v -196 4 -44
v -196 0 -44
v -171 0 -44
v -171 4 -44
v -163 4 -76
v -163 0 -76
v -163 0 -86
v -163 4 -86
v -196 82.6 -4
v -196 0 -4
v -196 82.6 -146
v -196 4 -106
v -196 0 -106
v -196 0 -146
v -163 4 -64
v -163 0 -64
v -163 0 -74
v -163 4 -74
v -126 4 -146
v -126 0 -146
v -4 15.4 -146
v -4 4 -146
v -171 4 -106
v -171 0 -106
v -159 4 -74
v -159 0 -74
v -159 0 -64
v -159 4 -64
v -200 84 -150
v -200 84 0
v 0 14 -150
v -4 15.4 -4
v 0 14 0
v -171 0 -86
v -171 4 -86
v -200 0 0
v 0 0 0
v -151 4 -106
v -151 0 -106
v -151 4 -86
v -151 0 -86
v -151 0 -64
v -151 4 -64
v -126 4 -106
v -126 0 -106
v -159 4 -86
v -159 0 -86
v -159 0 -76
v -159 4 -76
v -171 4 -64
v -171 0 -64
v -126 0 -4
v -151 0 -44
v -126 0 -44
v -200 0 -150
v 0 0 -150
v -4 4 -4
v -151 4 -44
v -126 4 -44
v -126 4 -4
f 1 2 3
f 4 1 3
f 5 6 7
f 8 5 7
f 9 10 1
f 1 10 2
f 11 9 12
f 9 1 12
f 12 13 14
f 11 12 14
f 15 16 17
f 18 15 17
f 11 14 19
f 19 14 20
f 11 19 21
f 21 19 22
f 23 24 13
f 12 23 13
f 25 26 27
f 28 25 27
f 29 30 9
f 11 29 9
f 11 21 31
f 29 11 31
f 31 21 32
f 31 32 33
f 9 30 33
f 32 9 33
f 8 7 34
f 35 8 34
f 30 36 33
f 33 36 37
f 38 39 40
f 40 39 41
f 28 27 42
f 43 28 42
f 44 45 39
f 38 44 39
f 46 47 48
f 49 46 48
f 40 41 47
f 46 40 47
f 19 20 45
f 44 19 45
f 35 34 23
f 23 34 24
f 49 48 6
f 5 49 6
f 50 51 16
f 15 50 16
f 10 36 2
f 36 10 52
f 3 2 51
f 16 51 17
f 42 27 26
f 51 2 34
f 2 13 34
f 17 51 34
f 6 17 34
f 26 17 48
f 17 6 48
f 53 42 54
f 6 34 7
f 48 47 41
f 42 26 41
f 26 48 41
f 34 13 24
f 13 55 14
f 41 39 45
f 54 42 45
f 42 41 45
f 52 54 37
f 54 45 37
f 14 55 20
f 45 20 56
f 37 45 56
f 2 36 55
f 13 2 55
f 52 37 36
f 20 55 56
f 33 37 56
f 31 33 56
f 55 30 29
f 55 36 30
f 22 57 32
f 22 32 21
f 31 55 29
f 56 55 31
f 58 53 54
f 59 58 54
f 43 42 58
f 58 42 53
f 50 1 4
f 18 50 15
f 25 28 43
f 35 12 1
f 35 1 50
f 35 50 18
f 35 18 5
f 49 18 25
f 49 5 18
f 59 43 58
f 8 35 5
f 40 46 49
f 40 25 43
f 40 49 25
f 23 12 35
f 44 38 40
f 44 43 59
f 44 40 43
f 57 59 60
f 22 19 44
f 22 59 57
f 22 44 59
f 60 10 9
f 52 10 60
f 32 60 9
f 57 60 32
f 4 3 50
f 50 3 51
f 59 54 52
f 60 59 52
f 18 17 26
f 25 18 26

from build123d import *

# Parameters (mm, degrees)
SKETCH1_W           = 200
SKETCH1_H           = 150
SKETCH1_W_2         = 192
SKETCH1_H_2         = 142
BOSS_EXTRUDE2_DEPTH = 4
SKETCH2_W           = 200
SKETCH2_H           = 150
SKETCH2_W_2         = 192
SKETCH2_H_2         = 142
BOSS_EXTRUDE3_DEPTH = 80
CUT_EXTRUDE1_DEPTH  = 150


with BuildPart() as part:
    # Sketch1 → Boss-Extrude2 (new body)
    # profile 1 of 3: a face of its own
    with BuildSketch(Plane(origin=(0, 0, 0), x_dir=(1, 0, 0), z_dir=(0, 1, 0))):
        with Locations((-100, 75)):
            Rectangle(SKETCH1_W, SKETCH1_H)
        with Locations((-100, 75)):
            Rectangle(SKETCH1_W_2, SKETCH1_H_2, mode=Mode.SUBTRACT)
    # profile 2 of 3: a face of its own
    with BuildSketch(Plane(origin=(0, 0, 0), x_dir=(1, 0, 0), z_dir=(0, 1, 0))):
        Polygon((-4, 75), (-196, 75), (-196, 44), (-171, 44), (-171, 64), (-163, 64), (-163, 74), (-159, 74), (-159, 64), (-151, 64), (-151, 44), (-126, 44), (-126, 4), (-4, 4), align=None)
    # profile 3 of 3: a face of its own
    with BuildSketch(Plane(origin=(0, 0, 0), x_dir=(1, 0, 0), z_dir=(0, 1, 0))):
        Polygon((-196, 106), (-196, 75), (-4, 75), (-4, 146), (-126, 146), (-126, 106), (-151, 106), (-151, 86), (-159, 86), (-159, 76), (-163, 76), (-163, 86), (-171, 86), (-171, 106), align=None)
    extrude(amount=BOSS_EXTRUDE2_DEPTH)

    # Sketch2 → Boss-Extrude3 (add)
    with BuildSketch(Plane(origin=(0, 4, 0), x_dir=(1, 0, 0), z_dir=(0, 1, 0))):
        with Locations((-100, 75)):
            Rectangle(SKETCH2_W, SKETCH2_H)
        with Locations((-100, 75)):
            Rectangle(SKETCH2_W_2, SKETCH2_H_2, mode=Mode.SUBTRACT)
    extrude(amount=BOSS_EXTRUDE3_DEPTH)

    # Sketch3 → Cut-Extrude1 (cut)
    with BuildSketch(Plane.XY):
        Polygon((-200, 84), (0, 14), (0, 84), align=None)
    extrude(amount=-CUT_EXTRUDE1_DEPTH, mode=Mode.SUBTRACT)


solid = part.part
